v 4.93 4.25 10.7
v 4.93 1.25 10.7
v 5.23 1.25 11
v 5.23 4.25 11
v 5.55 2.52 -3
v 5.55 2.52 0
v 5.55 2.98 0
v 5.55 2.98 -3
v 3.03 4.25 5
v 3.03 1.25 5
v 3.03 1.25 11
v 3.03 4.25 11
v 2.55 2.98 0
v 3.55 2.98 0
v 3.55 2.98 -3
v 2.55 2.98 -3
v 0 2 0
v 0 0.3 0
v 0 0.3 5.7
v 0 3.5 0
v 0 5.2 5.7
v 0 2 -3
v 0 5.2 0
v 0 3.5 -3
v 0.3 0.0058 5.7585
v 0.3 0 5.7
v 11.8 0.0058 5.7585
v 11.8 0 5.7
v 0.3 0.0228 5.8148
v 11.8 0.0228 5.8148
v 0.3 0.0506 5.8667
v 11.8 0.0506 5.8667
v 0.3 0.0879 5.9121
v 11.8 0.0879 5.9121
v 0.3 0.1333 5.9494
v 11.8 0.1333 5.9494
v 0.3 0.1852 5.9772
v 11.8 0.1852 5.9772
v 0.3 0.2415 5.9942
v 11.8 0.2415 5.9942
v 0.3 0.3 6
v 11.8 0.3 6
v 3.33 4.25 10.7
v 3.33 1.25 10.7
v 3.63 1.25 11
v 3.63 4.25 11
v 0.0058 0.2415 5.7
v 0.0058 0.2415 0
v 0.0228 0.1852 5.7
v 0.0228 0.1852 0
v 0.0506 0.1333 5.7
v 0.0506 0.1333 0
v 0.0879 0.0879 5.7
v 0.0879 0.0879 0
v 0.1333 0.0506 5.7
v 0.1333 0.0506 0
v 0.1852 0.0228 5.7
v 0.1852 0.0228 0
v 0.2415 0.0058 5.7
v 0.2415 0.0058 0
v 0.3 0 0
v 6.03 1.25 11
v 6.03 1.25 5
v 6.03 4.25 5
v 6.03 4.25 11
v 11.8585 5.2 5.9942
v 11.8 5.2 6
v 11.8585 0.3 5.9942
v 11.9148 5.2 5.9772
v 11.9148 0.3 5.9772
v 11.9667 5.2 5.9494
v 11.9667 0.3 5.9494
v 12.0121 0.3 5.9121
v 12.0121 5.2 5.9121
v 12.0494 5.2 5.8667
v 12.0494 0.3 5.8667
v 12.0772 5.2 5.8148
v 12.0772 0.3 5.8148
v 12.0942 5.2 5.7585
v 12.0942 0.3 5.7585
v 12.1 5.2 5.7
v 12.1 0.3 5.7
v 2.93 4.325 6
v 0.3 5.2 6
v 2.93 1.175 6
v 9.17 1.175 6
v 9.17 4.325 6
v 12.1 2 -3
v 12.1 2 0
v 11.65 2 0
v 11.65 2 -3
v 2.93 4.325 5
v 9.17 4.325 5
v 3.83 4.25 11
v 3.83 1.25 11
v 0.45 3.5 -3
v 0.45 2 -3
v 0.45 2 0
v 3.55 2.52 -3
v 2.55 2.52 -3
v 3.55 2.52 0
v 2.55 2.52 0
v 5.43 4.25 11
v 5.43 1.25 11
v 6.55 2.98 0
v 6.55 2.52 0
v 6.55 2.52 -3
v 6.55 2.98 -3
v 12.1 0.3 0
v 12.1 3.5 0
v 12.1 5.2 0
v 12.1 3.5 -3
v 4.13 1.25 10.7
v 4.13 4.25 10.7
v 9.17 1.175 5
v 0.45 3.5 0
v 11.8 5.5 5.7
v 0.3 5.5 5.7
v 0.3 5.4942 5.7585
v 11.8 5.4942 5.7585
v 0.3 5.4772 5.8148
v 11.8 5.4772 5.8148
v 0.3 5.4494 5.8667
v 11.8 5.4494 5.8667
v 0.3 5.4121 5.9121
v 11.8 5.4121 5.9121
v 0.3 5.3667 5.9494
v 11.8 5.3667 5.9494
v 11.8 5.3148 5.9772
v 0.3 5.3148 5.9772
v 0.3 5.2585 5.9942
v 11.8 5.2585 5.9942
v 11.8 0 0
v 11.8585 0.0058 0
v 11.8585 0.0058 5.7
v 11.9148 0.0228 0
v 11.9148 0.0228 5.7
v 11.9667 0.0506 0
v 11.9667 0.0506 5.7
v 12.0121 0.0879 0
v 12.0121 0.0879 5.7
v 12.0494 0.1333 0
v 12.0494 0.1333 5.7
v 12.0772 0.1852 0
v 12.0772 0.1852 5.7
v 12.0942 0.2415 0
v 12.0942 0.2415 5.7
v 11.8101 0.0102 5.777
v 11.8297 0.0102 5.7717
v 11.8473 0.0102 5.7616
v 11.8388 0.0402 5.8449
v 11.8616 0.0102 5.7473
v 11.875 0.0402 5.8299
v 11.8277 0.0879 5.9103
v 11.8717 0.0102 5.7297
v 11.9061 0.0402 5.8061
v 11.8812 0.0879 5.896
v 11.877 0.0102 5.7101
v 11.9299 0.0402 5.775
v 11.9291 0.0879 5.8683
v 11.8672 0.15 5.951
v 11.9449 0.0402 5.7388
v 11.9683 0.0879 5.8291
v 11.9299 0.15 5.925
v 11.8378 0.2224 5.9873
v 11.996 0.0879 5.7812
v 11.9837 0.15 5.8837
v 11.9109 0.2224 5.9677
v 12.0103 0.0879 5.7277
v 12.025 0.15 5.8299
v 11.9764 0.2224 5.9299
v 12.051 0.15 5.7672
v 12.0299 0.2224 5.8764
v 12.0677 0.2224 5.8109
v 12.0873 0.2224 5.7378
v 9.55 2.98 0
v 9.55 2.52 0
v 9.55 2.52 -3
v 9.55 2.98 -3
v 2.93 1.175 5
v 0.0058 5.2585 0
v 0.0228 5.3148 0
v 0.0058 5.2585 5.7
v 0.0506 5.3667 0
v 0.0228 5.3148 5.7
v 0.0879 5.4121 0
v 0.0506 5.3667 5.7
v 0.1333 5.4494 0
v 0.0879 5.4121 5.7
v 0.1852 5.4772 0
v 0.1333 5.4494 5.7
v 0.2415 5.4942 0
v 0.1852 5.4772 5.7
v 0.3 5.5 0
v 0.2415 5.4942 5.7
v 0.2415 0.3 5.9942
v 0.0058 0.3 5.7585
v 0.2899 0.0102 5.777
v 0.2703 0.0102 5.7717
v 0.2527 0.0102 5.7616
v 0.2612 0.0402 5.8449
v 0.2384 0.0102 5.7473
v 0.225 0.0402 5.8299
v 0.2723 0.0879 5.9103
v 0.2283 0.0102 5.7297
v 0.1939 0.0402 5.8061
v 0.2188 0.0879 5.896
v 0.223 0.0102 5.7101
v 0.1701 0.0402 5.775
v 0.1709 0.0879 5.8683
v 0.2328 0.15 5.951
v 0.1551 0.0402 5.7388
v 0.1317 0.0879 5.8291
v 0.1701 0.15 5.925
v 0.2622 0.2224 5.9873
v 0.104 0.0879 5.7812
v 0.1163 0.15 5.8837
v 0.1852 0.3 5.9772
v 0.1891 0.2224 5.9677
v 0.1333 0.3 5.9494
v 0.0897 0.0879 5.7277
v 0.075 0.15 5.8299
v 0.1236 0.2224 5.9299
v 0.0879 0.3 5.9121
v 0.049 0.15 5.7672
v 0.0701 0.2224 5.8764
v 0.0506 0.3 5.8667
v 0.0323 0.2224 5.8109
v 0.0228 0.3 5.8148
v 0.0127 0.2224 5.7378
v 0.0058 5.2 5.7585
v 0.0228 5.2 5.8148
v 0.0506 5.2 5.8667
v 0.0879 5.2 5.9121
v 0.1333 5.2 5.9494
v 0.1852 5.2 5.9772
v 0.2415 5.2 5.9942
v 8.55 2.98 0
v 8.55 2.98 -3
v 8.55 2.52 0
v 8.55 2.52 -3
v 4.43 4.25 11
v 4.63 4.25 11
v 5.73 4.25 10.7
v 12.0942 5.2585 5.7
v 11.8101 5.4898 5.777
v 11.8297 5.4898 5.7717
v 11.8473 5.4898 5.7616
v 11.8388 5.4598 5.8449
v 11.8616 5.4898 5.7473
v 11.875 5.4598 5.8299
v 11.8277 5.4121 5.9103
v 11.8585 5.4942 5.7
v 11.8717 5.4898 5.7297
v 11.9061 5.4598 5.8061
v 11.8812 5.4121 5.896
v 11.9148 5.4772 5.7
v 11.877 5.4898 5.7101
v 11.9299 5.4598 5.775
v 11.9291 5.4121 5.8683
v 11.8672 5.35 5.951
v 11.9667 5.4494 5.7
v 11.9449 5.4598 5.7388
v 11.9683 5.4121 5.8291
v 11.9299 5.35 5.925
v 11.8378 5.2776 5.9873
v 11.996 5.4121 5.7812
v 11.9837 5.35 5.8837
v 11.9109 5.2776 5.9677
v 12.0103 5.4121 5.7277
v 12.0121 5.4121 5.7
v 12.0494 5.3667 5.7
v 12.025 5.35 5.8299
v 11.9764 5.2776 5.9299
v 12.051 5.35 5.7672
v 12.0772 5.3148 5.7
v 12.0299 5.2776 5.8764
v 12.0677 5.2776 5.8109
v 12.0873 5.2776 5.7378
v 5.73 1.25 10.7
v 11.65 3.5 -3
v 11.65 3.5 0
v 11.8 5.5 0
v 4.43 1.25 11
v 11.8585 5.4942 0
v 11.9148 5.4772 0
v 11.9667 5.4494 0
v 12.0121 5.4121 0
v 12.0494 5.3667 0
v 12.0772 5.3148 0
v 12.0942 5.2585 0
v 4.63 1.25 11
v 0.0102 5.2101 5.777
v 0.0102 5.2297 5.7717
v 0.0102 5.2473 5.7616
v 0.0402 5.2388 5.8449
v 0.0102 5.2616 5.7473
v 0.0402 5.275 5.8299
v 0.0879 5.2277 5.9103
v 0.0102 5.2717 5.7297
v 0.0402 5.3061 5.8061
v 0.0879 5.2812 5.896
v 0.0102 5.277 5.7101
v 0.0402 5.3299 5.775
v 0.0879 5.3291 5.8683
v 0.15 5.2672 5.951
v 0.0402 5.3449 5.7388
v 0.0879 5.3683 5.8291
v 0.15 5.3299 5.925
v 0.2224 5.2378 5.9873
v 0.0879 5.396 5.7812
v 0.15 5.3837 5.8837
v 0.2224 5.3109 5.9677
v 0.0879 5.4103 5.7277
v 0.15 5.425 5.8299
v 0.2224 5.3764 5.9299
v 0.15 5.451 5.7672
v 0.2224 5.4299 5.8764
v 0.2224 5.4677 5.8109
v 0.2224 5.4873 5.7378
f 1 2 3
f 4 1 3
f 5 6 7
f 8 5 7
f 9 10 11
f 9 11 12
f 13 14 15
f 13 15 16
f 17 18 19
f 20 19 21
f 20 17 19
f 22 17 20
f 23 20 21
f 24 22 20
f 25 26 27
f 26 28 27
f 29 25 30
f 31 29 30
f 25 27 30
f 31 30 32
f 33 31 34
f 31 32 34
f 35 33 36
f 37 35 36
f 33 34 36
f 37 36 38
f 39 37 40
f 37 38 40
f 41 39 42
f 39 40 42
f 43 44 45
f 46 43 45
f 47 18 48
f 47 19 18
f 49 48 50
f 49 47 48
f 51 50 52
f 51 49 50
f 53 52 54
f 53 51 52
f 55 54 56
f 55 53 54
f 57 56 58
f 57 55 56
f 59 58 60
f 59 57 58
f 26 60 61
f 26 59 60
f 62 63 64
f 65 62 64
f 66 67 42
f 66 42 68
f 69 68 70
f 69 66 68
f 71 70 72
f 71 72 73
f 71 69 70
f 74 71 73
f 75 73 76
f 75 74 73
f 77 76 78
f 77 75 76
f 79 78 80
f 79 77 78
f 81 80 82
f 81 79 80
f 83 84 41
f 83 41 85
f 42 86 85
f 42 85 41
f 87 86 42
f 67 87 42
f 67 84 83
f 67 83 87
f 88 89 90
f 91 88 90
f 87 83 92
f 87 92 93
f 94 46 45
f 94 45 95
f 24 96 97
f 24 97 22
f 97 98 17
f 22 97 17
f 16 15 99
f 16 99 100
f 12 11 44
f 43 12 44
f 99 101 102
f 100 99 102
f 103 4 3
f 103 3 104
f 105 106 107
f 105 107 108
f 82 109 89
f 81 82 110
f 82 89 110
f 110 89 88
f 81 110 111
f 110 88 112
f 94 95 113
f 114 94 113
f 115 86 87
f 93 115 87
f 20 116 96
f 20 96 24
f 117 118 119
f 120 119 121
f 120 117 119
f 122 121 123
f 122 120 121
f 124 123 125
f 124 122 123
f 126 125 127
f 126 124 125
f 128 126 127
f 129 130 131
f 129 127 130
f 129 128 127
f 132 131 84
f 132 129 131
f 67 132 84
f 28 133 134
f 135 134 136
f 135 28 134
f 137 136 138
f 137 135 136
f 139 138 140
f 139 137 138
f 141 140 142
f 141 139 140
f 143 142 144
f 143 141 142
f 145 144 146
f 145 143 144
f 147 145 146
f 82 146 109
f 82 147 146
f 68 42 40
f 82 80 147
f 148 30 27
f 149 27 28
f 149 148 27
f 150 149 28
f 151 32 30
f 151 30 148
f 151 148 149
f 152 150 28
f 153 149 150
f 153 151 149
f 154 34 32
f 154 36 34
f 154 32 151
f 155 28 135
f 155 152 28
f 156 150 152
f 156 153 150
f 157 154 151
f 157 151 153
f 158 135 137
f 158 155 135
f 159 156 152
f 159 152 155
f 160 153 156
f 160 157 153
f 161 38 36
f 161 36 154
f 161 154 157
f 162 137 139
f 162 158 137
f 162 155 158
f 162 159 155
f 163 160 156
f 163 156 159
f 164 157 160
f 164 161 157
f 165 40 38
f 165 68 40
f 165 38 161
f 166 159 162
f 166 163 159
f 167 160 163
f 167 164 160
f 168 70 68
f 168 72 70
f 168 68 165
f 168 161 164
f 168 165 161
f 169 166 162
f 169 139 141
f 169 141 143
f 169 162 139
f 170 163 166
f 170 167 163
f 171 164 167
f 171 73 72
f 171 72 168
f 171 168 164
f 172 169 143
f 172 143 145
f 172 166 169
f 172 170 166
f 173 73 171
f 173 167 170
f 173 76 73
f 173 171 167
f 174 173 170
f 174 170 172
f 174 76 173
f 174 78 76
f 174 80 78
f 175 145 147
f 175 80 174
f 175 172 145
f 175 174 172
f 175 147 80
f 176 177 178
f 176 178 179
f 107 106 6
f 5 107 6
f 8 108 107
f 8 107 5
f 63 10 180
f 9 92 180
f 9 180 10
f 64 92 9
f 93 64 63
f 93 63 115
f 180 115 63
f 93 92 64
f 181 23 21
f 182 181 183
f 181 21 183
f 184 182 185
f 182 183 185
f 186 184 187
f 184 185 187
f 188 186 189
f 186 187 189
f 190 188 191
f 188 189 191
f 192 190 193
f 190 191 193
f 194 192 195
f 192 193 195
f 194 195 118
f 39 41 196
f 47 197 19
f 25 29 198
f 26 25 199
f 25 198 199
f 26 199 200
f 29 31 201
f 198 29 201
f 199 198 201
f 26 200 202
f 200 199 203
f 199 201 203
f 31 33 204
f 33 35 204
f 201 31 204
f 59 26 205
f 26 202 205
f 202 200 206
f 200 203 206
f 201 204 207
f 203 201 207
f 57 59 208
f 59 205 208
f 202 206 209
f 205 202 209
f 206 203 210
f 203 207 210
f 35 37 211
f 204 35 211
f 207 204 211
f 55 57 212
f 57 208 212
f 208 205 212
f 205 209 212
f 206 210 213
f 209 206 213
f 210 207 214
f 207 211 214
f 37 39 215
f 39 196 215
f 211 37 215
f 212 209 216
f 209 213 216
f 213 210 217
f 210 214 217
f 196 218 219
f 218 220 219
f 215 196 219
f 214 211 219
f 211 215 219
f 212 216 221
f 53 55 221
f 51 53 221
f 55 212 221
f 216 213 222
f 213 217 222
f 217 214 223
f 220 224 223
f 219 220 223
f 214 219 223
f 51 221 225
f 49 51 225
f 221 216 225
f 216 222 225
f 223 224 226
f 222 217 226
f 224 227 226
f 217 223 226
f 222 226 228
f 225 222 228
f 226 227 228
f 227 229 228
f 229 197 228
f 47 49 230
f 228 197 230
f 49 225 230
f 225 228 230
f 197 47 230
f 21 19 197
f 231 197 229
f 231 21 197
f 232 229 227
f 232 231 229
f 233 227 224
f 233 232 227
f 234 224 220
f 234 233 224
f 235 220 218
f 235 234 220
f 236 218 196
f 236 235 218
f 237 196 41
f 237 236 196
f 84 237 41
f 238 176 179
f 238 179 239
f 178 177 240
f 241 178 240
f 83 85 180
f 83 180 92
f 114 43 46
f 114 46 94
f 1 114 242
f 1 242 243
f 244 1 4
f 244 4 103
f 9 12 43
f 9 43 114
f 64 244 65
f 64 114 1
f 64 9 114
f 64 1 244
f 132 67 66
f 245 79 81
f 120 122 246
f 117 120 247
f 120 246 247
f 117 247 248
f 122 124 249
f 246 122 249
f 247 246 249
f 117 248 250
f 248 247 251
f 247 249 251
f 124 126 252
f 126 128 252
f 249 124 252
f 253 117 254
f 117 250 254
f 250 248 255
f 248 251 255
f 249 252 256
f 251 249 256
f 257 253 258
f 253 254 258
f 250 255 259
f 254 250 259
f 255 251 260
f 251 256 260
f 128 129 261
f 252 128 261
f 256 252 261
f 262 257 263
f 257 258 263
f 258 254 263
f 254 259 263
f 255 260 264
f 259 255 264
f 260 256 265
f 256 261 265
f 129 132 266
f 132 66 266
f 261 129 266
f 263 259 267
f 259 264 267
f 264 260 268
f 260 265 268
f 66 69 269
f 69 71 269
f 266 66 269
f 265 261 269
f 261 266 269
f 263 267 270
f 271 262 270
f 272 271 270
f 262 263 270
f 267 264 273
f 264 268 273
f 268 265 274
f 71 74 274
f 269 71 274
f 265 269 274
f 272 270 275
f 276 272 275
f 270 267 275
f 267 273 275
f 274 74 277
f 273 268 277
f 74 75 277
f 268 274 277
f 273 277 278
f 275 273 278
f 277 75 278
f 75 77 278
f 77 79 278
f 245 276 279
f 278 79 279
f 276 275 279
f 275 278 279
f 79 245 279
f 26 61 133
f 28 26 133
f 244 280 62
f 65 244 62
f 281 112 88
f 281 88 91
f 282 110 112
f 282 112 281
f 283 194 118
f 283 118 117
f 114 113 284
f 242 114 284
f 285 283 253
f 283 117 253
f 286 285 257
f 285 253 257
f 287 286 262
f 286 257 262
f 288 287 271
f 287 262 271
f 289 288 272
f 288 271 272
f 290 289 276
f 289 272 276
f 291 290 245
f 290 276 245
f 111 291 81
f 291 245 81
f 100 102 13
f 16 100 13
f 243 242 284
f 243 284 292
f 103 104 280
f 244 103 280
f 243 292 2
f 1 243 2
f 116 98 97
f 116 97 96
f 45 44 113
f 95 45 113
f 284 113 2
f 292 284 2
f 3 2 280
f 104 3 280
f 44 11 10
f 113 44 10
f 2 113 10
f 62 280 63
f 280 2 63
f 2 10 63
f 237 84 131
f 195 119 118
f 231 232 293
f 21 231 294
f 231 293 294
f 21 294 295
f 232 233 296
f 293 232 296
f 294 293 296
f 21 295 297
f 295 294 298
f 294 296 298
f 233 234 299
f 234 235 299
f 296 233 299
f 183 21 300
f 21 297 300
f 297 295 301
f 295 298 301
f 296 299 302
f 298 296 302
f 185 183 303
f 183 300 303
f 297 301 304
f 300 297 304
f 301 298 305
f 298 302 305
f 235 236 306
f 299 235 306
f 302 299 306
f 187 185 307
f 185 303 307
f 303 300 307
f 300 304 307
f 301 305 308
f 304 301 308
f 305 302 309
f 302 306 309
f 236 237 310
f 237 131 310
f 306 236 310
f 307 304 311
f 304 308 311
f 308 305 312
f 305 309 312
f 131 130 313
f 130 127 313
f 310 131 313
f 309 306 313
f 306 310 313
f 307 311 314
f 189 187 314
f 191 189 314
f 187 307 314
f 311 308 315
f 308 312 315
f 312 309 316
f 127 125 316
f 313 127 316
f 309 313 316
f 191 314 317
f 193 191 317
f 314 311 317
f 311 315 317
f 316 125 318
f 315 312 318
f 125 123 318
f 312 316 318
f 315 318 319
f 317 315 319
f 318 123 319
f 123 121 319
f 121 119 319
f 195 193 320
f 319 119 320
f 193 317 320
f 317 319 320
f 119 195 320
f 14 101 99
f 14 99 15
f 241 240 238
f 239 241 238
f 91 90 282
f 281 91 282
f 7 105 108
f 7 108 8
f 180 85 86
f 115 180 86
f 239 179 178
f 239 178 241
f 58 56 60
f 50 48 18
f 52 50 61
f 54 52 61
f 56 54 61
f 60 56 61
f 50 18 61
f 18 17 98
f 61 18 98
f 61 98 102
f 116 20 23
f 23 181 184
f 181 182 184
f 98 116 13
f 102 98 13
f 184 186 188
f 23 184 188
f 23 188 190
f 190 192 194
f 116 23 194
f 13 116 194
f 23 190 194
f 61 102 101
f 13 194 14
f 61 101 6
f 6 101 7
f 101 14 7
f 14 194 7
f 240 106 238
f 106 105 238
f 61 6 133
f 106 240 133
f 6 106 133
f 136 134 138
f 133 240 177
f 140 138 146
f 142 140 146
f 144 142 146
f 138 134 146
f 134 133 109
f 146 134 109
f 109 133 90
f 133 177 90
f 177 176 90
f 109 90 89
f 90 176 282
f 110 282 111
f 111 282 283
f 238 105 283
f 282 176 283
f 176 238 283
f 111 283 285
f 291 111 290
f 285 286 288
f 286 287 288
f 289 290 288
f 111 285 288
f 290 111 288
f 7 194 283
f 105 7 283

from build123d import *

# Parameters (mm, degrees)
SKETCH_3_W          = 12.1
SKETCH_3_H          = 5.5
EXTRUDE_1_DEPTH     = 6
SKETCH_4_W          = 6.24
SKETCH_4_H          = 3.15
CUT_EXTRUDE_1_DEPTH = 1
SKETCH_5_W          = 3
SKETCH_5_H          = 3
EXTRUDE_2_DEPTH     = 6
CUT_EXTRUDE_2_REACH = 18.896
SKETCH_7_W          = 1
SKETCH_7_H          = 0.46
SKETCH_7_W_2        = 0.45
SKETCH_7_H_2        = 1.5
EXTRUDE_3_DEPTH     = 3
FILLET_1_R          = 0.3


with BuildPart() as part:
    # Sketch 3 → Extrude 1 (new body)
    with BuildSketch(Plane.XY):
        with Locations((6.05, 2.75)):
            Rectangle(SKETCH_3_W, SKETCH_3_H)
    extrude(amount=EXTRUDE_1_DEPTH)

    # Sketch 4 → Cut-Extrude 1 (cut)
    with BuildSketch(Plane.XY.offset(6)):
        with Locations((6.05, 2.75)):
            Rectangle(SKETCH_4_W, SKETCH_4_H)
    extrude(amount=-CUT_EXTRUDE_1_DEPTH, mode=Mode.SUBTRACT)

    # Sketch 5 → Extrude 2 (add)
    with BuildSketch(Plane.XY.offset(5)):
        with Locations((4.53, 2.75)):
            Rectangle(SKETCH_5_W, SKETCH_5_H)
    extrude(amount=EXTRUDE_2_DEPTH)

    # Sketch 6 → Cut-Extrude 2 (cut, up to next)
    with BuildSketch(Plane.XZ.offset(-1.25), mode=Mode.PRIVATE) as cut_extrude_2_sk1:
        Polygon((3.03, 11), (3.33, 10.7), (3.63, 11), align=None)
    cut_extrude_2_tool1 = extrude(cut_extrude_2_sk1.sketch, amount=-CUT_EXTRUDE_2_REACH, mode=Mode.PRIVATE) & part.part
    # Sketch 6 → Cut-Extrude 2 (cut, up to next)
    with BuildSketch(Plane.XZ.offset(-1.25), mode=Mode.PRIVATE) as cut_extrude_2_sk2:
        Polygon((4.13, 10.7), (4.43, 11), (3.83, 11), align=None)
    cut_extrude_2_tool2 = extrude(cut_extrude_2_sk2.sketch, amount=-CUT_EXTRUDE_2_REACH, mode=Mode.PRIVATE) & part.part
    # Sketch 6 → Cut-Extrude 2 (cut, up to next)
    with BuildSketch(Plane.XZ.offset(-1.25), mode=Mode.PRIVATE) as cut_extrude_2_sk3:
        Polygon((4.93, 10.7), (5.23, 11), (4.63, 11), align=None)
    cut_extrude_2_tool3 = extrude(cut_extrude_2_sk3.sketch, amount=-CUT_EXTRUDE_2_REACH, mode=Mode.PRIVATE) & part.part
    # Sketch 6 → Cut-Extrude 2 (cut, up to next)
    with BuildSketch(Plane.XZ.offset(-1.25), mode=Mode.PRIVATE) as cut_extrude_2_sk4:
        Polygon((5.73, 10.7), (6.03, 11), (5.43, 11), align=None)
    cut_extrude_2_tool4 = extrude(cut_extrude_2_sk4.sketch, amount=-CUT_EXTRUDE_2_REACH, mode=Mode.PRIVATE) & part.part
    add(cut_extrude_2_tool1.solids().sort_by_distance((3.33, 1.25, 10.9))[0], mode=Mode.SUBTRACT)
    add(cut_extrude_2_tool2.solids().sort_by_distance((4.13, 1.25, 10.9))[0], mode=Mode.SUBTRACT)
    add(cut_extrude_2_tool3.solids().sort_by_distance((4.93, 1.25, 10.9))[0], mode=Mode.SUBTRACT)
    add(cut_extrude_2_tool4.solids().sort_by_distance((5.73, 1.25, 10.9))[0], mode=Mode.SUBTRACT)

    # Sketch 7 → Extrude 3 (add)
    with BuildSketch(Plane(origin=(0, 0, 0), x_dir=(-1, 0, 0), z_dir=(0, 0, -1))):
        with Locations((-3.05, 2.75)):
            Rectangle(SKETCH_7_W, SKETCH_7_H)
        with Locations((-6.05, 2.75)):
            Rectangle(SKETCH_7_W, SKETCH_7_H)
        with Locations((-9.05, 2.75)):
            Rectangle(SKETCH_7_W, SKETCH_7_H)
        with Locations((-11.875, 2.75)):
            Rectangle(SKETCH_7_W_2, SKETCH_7_H_2)
        with Locations((-0.225, 2.75)):
            Rectangle(SKETCH_7_W_2, SKETCH_7_H_2)
    extrude(amount=EXTRUDE_3_DEPTH)

    # Fillet 1
    fillet_1_edges = [part.edges().sort_by_distance(p)[0] for p in [
        (12.1, 2.75, 6),
        (6.05, 5.5, 6),
        (0, 2.75, 6),
        (6.05, 0, 6),
        (0, 5.5, 3),
        (12.1, 5.5, 3),
        (12.1, 0, 3),
        (0, 0, 3),
    ]]
    fillet(fillet_1_edges, radius=FILLET_1_R)


solid = part.part
